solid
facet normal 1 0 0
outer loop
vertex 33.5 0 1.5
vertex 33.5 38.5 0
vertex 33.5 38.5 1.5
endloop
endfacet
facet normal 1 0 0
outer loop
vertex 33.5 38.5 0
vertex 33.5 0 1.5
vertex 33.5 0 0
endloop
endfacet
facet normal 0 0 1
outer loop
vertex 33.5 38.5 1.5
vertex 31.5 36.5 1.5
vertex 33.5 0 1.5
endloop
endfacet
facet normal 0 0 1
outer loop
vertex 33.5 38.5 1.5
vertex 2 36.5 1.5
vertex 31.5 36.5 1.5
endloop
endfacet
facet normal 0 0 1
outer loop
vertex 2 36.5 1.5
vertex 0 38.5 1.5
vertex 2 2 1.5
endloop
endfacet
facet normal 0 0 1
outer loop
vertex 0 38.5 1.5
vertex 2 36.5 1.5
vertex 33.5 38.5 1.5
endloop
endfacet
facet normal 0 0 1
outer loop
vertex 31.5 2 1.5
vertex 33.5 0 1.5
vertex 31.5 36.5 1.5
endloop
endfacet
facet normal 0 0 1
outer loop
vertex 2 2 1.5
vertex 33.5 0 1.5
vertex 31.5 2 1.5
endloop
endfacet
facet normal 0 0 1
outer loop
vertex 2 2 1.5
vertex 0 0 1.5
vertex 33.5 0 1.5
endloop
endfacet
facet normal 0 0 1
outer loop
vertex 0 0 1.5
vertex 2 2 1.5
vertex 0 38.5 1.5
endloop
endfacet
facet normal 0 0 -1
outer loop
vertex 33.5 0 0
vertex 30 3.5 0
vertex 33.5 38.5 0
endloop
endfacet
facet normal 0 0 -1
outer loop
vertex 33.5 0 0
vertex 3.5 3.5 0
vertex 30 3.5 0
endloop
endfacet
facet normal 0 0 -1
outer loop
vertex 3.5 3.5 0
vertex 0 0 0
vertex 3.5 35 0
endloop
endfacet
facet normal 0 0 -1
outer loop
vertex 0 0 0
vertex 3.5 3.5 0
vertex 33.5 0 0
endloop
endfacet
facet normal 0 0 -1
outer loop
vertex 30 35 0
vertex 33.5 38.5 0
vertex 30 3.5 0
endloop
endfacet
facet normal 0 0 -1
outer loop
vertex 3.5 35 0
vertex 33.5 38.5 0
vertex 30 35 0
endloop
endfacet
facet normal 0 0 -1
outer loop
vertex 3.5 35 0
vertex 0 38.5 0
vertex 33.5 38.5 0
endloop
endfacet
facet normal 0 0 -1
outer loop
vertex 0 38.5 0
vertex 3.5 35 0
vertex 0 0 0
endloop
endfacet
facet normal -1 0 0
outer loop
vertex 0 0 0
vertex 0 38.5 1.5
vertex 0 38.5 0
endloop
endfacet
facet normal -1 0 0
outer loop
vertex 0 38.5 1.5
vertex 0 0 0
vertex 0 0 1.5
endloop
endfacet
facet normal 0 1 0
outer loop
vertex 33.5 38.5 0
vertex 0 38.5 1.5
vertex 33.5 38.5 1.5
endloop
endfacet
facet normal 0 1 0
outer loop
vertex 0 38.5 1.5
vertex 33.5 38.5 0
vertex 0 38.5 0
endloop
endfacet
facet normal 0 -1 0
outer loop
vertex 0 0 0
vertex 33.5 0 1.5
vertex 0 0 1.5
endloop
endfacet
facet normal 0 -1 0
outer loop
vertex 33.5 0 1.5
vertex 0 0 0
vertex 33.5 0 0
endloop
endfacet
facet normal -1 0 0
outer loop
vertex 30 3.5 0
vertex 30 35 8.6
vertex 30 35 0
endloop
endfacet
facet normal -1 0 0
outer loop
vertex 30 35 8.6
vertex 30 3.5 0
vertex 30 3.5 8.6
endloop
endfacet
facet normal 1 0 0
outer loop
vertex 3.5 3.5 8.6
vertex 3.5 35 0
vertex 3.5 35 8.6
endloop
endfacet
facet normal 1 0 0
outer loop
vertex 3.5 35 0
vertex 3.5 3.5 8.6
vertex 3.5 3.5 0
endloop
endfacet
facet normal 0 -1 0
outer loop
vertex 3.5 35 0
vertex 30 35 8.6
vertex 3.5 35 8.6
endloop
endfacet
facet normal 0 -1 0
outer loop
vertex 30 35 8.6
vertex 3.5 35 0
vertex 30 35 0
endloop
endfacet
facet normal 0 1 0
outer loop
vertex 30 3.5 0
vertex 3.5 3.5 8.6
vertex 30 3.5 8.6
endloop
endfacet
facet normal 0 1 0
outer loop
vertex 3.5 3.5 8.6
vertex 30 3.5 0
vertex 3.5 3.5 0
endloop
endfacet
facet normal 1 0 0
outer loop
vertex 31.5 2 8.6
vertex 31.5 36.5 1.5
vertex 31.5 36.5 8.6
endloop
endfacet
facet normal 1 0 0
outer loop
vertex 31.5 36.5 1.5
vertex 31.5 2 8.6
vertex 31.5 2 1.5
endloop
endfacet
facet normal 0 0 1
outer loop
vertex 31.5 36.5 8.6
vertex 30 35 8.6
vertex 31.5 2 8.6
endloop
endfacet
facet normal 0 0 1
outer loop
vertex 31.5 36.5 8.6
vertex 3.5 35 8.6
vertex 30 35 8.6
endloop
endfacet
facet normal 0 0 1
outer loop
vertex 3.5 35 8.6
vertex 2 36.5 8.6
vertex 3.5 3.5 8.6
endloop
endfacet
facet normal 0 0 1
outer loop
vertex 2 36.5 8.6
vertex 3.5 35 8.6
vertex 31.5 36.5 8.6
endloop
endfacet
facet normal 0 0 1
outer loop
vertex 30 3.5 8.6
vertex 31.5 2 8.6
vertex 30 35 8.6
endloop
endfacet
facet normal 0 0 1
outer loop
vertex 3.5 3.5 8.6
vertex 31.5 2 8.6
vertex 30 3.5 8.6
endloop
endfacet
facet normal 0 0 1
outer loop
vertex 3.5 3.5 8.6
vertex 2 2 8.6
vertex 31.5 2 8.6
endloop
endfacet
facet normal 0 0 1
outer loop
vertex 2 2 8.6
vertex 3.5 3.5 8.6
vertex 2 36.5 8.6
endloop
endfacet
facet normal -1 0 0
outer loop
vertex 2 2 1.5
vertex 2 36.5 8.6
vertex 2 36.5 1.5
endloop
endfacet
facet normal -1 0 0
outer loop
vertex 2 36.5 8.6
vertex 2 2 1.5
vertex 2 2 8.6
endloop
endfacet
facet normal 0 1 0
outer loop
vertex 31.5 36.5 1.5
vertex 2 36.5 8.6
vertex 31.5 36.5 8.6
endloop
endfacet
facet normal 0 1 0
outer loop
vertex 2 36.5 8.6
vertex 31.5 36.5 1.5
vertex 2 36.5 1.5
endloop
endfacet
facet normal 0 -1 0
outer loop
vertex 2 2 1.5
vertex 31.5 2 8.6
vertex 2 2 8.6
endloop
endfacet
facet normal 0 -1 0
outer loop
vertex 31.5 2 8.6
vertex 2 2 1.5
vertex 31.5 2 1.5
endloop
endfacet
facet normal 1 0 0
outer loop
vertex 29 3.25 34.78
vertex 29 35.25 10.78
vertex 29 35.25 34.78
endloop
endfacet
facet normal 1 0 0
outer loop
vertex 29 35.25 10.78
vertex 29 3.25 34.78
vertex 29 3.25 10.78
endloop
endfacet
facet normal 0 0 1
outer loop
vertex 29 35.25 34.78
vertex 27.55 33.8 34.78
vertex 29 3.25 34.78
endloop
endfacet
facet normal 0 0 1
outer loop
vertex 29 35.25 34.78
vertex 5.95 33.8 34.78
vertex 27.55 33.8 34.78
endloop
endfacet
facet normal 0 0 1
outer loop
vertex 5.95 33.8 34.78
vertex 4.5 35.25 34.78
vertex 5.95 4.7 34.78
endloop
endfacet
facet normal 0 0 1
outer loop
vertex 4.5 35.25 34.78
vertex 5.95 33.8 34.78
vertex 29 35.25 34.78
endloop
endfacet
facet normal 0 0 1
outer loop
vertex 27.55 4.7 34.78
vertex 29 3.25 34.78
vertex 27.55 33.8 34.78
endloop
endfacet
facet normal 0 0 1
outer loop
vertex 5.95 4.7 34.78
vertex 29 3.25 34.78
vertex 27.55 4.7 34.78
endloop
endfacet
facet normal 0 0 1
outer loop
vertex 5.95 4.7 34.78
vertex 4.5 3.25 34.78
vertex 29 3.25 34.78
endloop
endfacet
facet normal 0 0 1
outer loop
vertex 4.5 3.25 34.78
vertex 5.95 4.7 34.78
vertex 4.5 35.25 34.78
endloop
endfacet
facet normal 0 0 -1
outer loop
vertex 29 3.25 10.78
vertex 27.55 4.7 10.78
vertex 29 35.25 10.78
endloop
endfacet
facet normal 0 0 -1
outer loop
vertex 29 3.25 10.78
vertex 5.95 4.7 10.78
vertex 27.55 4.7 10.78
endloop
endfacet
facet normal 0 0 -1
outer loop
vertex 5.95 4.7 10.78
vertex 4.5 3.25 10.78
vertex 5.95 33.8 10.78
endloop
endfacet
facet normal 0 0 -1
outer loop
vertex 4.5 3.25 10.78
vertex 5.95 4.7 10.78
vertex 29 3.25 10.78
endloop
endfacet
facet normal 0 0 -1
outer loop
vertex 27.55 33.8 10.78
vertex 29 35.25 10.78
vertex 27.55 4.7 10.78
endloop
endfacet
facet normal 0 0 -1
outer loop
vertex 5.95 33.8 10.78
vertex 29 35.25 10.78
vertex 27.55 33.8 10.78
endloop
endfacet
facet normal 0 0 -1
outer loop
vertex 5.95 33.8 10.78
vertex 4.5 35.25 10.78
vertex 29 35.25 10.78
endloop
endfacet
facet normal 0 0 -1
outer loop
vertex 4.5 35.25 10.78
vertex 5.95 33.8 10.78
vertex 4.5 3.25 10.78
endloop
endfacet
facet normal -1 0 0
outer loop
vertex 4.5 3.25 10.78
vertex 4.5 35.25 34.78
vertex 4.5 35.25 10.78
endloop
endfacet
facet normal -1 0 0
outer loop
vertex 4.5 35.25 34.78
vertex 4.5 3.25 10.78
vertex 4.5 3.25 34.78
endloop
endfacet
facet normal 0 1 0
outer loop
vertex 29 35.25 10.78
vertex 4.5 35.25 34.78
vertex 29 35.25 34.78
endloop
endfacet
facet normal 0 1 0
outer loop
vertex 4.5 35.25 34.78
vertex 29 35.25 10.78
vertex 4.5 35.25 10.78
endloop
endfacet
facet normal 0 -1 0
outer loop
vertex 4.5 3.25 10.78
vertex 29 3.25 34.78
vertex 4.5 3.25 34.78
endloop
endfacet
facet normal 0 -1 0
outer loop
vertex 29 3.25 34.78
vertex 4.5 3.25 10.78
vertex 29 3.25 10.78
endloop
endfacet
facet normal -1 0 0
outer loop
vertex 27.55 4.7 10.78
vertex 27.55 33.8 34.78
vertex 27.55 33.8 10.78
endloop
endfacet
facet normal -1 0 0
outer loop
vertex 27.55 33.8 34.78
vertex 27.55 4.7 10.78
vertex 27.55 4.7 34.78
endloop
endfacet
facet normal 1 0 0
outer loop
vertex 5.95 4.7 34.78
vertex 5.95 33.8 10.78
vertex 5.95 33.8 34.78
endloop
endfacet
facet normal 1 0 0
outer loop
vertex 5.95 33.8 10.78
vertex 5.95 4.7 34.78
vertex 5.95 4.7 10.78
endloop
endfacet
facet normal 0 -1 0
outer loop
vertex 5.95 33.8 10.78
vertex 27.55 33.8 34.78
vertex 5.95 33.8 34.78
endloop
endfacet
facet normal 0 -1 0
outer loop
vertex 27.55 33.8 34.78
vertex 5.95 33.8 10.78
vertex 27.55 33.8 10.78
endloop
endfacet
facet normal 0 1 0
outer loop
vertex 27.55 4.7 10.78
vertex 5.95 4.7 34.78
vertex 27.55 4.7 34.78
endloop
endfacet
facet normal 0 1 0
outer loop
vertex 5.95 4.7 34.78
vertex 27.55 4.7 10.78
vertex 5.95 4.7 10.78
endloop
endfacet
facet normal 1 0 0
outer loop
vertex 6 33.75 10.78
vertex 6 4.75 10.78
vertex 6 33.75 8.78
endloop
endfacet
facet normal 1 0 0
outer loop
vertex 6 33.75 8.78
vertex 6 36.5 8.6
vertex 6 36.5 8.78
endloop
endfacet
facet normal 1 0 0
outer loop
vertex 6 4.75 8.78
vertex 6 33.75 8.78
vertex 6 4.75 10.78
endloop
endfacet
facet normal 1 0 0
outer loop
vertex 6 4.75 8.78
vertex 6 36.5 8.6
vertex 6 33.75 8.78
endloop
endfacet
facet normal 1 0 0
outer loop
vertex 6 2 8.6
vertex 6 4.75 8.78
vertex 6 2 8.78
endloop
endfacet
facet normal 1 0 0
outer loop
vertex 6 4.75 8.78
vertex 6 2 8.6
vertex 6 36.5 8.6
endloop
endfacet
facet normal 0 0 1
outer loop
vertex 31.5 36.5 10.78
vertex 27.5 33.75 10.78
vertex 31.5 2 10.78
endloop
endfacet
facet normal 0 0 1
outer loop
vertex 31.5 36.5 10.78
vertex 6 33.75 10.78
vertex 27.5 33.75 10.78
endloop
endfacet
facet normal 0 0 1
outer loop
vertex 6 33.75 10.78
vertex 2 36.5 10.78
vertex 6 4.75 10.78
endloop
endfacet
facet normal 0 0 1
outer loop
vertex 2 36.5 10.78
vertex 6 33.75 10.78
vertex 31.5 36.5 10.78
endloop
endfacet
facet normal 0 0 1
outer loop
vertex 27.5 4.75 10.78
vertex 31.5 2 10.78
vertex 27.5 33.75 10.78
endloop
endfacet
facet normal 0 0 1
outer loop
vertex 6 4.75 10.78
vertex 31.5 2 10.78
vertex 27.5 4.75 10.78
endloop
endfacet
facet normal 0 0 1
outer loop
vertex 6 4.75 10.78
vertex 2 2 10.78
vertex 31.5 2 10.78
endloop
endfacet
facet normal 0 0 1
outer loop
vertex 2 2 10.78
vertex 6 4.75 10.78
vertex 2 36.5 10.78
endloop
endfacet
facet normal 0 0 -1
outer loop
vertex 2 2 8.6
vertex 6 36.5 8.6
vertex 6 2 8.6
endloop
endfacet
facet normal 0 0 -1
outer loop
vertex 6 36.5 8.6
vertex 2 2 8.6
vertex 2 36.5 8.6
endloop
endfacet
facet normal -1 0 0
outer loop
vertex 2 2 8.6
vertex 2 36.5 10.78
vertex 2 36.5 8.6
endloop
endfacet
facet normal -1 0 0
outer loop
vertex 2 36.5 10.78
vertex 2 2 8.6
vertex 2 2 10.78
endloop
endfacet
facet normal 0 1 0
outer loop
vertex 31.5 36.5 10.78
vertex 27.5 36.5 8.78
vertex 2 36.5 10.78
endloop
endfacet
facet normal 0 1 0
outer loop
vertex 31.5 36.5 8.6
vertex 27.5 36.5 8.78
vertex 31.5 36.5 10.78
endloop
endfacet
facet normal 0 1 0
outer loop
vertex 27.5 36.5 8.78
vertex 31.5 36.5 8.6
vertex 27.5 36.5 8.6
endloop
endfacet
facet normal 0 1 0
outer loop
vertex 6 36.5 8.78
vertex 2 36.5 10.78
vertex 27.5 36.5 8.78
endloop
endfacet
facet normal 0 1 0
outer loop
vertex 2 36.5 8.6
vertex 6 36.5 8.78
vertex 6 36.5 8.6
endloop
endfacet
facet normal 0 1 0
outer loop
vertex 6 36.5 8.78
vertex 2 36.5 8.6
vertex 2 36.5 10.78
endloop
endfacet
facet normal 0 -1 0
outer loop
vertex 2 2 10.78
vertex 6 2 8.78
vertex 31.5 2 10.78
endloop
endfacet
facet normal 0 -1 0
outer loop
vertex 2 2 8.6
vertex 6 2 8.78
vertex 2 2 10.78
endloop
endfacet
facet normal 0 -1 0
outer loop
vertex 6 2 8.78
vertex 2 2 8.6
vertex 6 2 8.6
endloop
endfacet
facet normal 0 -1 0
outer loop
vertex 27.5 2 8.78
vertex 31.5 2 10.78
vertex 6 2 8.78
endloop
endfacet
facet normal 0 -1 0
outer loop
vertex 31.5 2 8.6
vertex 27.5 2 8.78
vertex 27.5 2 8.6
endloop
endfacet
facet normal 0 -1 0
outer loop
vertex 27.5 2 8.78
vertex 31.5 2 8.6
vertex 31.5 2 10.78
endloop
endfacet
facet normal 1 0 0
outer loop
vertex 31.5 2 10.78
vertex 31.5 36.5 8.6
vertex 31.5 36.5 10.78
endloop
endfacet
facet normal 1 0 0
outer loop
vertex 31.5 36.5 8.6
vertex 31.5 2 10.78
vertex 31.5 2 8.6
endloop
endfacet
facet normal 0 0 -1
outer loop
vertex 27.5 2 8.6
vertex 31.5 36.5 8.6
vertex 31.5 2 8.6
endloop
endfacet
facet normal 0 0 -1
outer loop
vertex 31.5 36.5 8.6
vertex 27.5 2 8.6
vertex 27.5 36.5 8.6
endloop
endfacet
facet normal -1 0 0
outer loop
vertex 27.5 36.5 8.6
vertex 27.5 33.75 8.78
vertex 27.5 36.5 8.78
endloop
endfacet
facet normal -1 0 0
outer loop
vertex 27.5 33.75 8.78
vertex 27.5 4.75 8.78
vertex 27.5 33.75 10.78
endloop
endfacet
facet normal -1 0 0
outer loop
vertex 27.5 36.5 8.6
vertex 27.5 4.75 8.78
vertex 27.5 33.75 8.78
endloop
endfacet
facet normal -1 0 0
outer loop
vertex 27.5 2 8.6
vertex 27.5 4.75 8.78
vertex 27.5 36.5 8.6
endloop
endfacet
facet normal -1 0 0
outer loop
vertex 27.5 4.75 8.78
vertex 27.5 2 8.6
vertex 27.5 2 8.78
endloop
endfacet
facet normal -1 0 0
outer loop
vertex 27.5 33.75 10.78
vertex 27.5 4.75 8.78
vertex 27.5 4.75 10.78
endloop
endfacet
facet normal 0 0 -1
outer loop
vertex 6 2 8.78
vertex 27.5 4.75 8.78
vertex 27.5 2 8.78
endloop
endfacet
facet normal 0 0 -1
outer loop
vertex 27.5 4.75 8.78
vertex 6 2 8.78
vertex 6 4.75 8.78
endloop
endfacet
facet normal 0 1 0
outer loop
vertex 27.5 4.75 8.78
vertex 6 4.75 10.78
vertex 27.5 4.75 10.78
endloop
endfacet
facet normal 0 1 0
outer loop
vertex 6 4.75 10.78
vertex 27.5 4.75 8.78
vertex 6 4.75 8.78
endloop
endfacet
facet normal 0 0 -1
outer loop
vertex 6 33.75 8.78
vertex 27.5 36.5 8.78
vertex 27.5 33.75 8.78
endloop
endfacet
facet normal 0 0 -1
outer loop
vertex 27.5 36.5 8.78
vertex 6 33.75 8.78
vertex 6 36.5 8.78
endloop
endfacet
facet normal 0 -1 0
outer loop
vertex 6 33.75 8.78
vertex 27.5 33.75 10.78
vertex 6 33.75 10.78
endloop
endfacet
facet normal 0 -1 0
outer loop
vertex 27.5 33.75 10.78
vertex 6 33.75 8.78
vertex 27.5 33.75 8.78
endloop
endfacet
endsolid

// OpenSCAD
// Switch Socket for mounting the switch below the panel
// KBS3056 29.12.2018
switch_width            = 21.5;// without collet
switch_length           = 29;  // without collet
switch_deepth           = 26;  // without collet, with or without terminals
switch_bridge_width     = 2;   // default 2

sunk_width              = 26.5;  // bigger than switch collet
sunk_length             = 31.5;  // bigger than switch collet
sunk_deepth             = 8.6;   // bigger than switch collet height + lever

collet_brim             = 2;   // default 2
collet_height           = 1.5; // default 1.5

wall_thickness          = 1.5; // default 1.5
///////////////////////////////////////////////////////////////////////////
switch_cover            = 1;// [0:1]



union(){
    //collet
    difference(){
        cube([sunk_width + 2 * wall_thickness + 2 * collet_brim, sunk_length + 2 * wall_thickness + 2 * collet_brim, collet_height]);
        translate([collet_brim + wall_thickness, collet_brim + wall_thickness, -0.1])
        cube([sunk_width, sunk_length, collet_height + 0.2]);
    }
    
    //sunk
    translate([collet_brim, collet_brim, collet_height]){
        difference(){
            cube([sunk_width + 2 * wall_thickness, sunk_length + 2 *    wall_thickness, sunk_deepth - collet_height]);
            translate([wall_thickness, wall_thickness, -0.1])
            cube([sunk_width, sunk_length, sunk_deepth - collet_height + 0.2]);
        }
    }
    
    //switch
    translate([collet_brim, collet_brim, sunk_deepth]){
        cube([(sunk_width - switch_width) / 2 + wall_thickness, sunk_length + 2 * wall_thickness, switch_bridge_width + 0.18]);
        translate([sunk_width - (sunk_width - switch_width) / 2 + wall_thickness, 0, 0])
        cube([(sunk_width - switch_width) / 2 + wall_thickness, sunk_length + 2 * wall_thickness, switch_bridge_width + 0.18]);
        
        translate([0, 0, 0.18])
        cube([sunk_width + 2 * wall_thickness, (sunk_length - switch_length) / 2 + wall_thickness, switch_bridge_width]); 
        translate([0, sunk_length - (sunk_length - switch_length) / 2 + wall_thickness, 0.18])
        cube([sunk_width + 2 * wall_thickness, (sunk_length - switch_length) / 2 + wall_thickness, switch_bridge_width]); 
        
        //switch cover
        if (switch_cover){
            translate([(sunk_width - switch_width) / 2, (sunk_length - switch_length) / 2, switch_bridge_width + 0.18]){
                difference(){
                    cube([switch_width + 2 * wall_thickness, switch_length + 2 * wall_thickness, switch_deepth - switch_bridge_width]);
                    translate([wall_thickness - 0.05, wall_thickness - 0.05, -0.1])
                    cube([switch_width + 0.1, switch_length + 0.1, switch_deepth - switch_bridge_width + 0.2]);
                }
            }
        }
    }
}
